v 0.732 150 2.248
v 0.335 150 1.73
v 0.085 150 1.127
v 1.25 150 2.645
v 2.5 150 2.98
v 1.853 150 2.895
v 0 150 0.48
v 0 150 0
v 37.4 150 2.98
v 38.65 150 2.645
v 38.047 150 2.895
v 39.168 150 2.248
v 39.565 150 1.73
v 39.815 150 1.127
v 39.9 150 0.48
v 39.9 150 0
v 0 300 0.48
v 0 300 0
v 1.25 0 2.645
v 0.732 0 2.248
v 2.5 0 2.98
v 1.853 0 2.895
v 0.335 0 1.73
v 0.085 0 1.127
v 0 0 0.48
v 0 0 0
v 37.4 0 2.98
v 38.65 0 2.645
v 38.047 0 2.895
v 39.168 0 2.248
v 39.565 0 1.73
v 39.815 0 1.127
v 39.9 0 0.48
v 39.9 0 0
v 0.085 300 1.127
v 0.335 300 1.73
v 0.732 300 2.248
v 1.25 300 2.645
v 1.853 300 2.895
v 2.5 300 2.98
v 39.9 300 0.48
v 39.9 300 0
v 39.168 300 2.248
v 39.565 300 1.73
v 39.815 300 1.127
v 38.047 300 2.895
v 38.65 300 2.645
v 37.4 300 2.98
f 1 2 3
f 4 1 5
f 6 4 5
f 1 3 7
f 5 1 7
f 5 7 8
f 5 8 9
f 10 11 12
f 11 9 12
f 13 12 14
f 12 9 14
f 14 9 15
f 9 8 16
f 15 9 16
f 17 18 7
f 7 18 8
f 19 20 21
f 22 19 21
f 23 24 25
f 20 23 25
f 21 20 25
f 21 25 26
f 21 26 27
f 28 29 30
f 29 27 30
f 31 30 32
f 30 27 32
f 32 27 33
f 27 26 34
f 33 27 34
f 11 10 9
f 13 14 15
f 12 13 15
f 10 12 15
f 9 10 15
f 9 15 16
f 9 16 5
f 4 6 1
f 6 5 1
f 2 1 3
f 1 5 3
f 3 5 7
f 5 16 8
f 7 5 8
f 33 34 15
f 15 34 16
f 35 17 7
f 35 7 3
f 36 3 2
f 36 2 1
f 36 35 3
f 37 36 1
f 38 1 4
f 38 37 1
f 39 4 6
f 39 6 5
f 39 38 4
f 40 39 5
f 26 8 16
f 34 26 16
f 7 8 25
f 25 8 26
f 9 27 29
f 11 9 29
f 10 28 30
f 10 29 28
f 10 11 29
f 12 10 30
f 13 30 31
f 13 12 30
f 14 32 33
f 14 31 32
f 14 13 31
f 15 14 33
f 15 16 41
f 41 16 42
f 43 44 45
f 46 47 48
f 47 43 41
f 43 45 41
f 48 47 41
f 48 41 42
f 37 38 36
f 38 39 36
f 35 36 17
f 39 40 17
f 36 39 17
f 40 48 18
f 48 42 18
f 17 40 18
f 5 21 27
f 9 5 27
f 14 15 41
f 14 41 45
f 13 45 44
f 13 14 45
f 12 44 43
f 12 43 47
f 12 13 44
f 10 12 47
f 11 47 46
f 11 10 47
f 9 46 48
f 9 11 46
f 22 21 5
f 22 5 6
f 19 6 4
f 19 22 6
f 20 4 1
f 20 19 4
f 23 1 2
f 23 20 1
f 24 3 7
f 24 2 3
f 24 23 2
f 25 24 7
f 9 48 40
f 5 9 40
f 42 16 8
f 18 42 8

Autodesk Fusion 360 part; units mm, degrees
sketch "Sketch1" plane through (0, 0, 0) normal (0, 0, 1) x (1, 0, 0)
  line L0 (0, 0) -> (39.9, 0)
  line L1 (39.9, 0) -> (39.9, 150)
  line L2 (39.9, 150) -> (0, 150)
  line L3 (0, 150) -> (0, 0)
  dimension "d1" = 39.9
  dimension "d2" = 150
extrude "Extrude1" add sketch "Sketch1" along normal blind 2.98 makes body 1
fillet "Fillet1" radius 2.5 2 edges at (39.9, 75, 2.98) (0, 75, 2.98) on bodies 1
mirror "Mirror1" about plane through (39.9, 150, 0) normal (0, 1, 0) of bodies 1 makes body 2
